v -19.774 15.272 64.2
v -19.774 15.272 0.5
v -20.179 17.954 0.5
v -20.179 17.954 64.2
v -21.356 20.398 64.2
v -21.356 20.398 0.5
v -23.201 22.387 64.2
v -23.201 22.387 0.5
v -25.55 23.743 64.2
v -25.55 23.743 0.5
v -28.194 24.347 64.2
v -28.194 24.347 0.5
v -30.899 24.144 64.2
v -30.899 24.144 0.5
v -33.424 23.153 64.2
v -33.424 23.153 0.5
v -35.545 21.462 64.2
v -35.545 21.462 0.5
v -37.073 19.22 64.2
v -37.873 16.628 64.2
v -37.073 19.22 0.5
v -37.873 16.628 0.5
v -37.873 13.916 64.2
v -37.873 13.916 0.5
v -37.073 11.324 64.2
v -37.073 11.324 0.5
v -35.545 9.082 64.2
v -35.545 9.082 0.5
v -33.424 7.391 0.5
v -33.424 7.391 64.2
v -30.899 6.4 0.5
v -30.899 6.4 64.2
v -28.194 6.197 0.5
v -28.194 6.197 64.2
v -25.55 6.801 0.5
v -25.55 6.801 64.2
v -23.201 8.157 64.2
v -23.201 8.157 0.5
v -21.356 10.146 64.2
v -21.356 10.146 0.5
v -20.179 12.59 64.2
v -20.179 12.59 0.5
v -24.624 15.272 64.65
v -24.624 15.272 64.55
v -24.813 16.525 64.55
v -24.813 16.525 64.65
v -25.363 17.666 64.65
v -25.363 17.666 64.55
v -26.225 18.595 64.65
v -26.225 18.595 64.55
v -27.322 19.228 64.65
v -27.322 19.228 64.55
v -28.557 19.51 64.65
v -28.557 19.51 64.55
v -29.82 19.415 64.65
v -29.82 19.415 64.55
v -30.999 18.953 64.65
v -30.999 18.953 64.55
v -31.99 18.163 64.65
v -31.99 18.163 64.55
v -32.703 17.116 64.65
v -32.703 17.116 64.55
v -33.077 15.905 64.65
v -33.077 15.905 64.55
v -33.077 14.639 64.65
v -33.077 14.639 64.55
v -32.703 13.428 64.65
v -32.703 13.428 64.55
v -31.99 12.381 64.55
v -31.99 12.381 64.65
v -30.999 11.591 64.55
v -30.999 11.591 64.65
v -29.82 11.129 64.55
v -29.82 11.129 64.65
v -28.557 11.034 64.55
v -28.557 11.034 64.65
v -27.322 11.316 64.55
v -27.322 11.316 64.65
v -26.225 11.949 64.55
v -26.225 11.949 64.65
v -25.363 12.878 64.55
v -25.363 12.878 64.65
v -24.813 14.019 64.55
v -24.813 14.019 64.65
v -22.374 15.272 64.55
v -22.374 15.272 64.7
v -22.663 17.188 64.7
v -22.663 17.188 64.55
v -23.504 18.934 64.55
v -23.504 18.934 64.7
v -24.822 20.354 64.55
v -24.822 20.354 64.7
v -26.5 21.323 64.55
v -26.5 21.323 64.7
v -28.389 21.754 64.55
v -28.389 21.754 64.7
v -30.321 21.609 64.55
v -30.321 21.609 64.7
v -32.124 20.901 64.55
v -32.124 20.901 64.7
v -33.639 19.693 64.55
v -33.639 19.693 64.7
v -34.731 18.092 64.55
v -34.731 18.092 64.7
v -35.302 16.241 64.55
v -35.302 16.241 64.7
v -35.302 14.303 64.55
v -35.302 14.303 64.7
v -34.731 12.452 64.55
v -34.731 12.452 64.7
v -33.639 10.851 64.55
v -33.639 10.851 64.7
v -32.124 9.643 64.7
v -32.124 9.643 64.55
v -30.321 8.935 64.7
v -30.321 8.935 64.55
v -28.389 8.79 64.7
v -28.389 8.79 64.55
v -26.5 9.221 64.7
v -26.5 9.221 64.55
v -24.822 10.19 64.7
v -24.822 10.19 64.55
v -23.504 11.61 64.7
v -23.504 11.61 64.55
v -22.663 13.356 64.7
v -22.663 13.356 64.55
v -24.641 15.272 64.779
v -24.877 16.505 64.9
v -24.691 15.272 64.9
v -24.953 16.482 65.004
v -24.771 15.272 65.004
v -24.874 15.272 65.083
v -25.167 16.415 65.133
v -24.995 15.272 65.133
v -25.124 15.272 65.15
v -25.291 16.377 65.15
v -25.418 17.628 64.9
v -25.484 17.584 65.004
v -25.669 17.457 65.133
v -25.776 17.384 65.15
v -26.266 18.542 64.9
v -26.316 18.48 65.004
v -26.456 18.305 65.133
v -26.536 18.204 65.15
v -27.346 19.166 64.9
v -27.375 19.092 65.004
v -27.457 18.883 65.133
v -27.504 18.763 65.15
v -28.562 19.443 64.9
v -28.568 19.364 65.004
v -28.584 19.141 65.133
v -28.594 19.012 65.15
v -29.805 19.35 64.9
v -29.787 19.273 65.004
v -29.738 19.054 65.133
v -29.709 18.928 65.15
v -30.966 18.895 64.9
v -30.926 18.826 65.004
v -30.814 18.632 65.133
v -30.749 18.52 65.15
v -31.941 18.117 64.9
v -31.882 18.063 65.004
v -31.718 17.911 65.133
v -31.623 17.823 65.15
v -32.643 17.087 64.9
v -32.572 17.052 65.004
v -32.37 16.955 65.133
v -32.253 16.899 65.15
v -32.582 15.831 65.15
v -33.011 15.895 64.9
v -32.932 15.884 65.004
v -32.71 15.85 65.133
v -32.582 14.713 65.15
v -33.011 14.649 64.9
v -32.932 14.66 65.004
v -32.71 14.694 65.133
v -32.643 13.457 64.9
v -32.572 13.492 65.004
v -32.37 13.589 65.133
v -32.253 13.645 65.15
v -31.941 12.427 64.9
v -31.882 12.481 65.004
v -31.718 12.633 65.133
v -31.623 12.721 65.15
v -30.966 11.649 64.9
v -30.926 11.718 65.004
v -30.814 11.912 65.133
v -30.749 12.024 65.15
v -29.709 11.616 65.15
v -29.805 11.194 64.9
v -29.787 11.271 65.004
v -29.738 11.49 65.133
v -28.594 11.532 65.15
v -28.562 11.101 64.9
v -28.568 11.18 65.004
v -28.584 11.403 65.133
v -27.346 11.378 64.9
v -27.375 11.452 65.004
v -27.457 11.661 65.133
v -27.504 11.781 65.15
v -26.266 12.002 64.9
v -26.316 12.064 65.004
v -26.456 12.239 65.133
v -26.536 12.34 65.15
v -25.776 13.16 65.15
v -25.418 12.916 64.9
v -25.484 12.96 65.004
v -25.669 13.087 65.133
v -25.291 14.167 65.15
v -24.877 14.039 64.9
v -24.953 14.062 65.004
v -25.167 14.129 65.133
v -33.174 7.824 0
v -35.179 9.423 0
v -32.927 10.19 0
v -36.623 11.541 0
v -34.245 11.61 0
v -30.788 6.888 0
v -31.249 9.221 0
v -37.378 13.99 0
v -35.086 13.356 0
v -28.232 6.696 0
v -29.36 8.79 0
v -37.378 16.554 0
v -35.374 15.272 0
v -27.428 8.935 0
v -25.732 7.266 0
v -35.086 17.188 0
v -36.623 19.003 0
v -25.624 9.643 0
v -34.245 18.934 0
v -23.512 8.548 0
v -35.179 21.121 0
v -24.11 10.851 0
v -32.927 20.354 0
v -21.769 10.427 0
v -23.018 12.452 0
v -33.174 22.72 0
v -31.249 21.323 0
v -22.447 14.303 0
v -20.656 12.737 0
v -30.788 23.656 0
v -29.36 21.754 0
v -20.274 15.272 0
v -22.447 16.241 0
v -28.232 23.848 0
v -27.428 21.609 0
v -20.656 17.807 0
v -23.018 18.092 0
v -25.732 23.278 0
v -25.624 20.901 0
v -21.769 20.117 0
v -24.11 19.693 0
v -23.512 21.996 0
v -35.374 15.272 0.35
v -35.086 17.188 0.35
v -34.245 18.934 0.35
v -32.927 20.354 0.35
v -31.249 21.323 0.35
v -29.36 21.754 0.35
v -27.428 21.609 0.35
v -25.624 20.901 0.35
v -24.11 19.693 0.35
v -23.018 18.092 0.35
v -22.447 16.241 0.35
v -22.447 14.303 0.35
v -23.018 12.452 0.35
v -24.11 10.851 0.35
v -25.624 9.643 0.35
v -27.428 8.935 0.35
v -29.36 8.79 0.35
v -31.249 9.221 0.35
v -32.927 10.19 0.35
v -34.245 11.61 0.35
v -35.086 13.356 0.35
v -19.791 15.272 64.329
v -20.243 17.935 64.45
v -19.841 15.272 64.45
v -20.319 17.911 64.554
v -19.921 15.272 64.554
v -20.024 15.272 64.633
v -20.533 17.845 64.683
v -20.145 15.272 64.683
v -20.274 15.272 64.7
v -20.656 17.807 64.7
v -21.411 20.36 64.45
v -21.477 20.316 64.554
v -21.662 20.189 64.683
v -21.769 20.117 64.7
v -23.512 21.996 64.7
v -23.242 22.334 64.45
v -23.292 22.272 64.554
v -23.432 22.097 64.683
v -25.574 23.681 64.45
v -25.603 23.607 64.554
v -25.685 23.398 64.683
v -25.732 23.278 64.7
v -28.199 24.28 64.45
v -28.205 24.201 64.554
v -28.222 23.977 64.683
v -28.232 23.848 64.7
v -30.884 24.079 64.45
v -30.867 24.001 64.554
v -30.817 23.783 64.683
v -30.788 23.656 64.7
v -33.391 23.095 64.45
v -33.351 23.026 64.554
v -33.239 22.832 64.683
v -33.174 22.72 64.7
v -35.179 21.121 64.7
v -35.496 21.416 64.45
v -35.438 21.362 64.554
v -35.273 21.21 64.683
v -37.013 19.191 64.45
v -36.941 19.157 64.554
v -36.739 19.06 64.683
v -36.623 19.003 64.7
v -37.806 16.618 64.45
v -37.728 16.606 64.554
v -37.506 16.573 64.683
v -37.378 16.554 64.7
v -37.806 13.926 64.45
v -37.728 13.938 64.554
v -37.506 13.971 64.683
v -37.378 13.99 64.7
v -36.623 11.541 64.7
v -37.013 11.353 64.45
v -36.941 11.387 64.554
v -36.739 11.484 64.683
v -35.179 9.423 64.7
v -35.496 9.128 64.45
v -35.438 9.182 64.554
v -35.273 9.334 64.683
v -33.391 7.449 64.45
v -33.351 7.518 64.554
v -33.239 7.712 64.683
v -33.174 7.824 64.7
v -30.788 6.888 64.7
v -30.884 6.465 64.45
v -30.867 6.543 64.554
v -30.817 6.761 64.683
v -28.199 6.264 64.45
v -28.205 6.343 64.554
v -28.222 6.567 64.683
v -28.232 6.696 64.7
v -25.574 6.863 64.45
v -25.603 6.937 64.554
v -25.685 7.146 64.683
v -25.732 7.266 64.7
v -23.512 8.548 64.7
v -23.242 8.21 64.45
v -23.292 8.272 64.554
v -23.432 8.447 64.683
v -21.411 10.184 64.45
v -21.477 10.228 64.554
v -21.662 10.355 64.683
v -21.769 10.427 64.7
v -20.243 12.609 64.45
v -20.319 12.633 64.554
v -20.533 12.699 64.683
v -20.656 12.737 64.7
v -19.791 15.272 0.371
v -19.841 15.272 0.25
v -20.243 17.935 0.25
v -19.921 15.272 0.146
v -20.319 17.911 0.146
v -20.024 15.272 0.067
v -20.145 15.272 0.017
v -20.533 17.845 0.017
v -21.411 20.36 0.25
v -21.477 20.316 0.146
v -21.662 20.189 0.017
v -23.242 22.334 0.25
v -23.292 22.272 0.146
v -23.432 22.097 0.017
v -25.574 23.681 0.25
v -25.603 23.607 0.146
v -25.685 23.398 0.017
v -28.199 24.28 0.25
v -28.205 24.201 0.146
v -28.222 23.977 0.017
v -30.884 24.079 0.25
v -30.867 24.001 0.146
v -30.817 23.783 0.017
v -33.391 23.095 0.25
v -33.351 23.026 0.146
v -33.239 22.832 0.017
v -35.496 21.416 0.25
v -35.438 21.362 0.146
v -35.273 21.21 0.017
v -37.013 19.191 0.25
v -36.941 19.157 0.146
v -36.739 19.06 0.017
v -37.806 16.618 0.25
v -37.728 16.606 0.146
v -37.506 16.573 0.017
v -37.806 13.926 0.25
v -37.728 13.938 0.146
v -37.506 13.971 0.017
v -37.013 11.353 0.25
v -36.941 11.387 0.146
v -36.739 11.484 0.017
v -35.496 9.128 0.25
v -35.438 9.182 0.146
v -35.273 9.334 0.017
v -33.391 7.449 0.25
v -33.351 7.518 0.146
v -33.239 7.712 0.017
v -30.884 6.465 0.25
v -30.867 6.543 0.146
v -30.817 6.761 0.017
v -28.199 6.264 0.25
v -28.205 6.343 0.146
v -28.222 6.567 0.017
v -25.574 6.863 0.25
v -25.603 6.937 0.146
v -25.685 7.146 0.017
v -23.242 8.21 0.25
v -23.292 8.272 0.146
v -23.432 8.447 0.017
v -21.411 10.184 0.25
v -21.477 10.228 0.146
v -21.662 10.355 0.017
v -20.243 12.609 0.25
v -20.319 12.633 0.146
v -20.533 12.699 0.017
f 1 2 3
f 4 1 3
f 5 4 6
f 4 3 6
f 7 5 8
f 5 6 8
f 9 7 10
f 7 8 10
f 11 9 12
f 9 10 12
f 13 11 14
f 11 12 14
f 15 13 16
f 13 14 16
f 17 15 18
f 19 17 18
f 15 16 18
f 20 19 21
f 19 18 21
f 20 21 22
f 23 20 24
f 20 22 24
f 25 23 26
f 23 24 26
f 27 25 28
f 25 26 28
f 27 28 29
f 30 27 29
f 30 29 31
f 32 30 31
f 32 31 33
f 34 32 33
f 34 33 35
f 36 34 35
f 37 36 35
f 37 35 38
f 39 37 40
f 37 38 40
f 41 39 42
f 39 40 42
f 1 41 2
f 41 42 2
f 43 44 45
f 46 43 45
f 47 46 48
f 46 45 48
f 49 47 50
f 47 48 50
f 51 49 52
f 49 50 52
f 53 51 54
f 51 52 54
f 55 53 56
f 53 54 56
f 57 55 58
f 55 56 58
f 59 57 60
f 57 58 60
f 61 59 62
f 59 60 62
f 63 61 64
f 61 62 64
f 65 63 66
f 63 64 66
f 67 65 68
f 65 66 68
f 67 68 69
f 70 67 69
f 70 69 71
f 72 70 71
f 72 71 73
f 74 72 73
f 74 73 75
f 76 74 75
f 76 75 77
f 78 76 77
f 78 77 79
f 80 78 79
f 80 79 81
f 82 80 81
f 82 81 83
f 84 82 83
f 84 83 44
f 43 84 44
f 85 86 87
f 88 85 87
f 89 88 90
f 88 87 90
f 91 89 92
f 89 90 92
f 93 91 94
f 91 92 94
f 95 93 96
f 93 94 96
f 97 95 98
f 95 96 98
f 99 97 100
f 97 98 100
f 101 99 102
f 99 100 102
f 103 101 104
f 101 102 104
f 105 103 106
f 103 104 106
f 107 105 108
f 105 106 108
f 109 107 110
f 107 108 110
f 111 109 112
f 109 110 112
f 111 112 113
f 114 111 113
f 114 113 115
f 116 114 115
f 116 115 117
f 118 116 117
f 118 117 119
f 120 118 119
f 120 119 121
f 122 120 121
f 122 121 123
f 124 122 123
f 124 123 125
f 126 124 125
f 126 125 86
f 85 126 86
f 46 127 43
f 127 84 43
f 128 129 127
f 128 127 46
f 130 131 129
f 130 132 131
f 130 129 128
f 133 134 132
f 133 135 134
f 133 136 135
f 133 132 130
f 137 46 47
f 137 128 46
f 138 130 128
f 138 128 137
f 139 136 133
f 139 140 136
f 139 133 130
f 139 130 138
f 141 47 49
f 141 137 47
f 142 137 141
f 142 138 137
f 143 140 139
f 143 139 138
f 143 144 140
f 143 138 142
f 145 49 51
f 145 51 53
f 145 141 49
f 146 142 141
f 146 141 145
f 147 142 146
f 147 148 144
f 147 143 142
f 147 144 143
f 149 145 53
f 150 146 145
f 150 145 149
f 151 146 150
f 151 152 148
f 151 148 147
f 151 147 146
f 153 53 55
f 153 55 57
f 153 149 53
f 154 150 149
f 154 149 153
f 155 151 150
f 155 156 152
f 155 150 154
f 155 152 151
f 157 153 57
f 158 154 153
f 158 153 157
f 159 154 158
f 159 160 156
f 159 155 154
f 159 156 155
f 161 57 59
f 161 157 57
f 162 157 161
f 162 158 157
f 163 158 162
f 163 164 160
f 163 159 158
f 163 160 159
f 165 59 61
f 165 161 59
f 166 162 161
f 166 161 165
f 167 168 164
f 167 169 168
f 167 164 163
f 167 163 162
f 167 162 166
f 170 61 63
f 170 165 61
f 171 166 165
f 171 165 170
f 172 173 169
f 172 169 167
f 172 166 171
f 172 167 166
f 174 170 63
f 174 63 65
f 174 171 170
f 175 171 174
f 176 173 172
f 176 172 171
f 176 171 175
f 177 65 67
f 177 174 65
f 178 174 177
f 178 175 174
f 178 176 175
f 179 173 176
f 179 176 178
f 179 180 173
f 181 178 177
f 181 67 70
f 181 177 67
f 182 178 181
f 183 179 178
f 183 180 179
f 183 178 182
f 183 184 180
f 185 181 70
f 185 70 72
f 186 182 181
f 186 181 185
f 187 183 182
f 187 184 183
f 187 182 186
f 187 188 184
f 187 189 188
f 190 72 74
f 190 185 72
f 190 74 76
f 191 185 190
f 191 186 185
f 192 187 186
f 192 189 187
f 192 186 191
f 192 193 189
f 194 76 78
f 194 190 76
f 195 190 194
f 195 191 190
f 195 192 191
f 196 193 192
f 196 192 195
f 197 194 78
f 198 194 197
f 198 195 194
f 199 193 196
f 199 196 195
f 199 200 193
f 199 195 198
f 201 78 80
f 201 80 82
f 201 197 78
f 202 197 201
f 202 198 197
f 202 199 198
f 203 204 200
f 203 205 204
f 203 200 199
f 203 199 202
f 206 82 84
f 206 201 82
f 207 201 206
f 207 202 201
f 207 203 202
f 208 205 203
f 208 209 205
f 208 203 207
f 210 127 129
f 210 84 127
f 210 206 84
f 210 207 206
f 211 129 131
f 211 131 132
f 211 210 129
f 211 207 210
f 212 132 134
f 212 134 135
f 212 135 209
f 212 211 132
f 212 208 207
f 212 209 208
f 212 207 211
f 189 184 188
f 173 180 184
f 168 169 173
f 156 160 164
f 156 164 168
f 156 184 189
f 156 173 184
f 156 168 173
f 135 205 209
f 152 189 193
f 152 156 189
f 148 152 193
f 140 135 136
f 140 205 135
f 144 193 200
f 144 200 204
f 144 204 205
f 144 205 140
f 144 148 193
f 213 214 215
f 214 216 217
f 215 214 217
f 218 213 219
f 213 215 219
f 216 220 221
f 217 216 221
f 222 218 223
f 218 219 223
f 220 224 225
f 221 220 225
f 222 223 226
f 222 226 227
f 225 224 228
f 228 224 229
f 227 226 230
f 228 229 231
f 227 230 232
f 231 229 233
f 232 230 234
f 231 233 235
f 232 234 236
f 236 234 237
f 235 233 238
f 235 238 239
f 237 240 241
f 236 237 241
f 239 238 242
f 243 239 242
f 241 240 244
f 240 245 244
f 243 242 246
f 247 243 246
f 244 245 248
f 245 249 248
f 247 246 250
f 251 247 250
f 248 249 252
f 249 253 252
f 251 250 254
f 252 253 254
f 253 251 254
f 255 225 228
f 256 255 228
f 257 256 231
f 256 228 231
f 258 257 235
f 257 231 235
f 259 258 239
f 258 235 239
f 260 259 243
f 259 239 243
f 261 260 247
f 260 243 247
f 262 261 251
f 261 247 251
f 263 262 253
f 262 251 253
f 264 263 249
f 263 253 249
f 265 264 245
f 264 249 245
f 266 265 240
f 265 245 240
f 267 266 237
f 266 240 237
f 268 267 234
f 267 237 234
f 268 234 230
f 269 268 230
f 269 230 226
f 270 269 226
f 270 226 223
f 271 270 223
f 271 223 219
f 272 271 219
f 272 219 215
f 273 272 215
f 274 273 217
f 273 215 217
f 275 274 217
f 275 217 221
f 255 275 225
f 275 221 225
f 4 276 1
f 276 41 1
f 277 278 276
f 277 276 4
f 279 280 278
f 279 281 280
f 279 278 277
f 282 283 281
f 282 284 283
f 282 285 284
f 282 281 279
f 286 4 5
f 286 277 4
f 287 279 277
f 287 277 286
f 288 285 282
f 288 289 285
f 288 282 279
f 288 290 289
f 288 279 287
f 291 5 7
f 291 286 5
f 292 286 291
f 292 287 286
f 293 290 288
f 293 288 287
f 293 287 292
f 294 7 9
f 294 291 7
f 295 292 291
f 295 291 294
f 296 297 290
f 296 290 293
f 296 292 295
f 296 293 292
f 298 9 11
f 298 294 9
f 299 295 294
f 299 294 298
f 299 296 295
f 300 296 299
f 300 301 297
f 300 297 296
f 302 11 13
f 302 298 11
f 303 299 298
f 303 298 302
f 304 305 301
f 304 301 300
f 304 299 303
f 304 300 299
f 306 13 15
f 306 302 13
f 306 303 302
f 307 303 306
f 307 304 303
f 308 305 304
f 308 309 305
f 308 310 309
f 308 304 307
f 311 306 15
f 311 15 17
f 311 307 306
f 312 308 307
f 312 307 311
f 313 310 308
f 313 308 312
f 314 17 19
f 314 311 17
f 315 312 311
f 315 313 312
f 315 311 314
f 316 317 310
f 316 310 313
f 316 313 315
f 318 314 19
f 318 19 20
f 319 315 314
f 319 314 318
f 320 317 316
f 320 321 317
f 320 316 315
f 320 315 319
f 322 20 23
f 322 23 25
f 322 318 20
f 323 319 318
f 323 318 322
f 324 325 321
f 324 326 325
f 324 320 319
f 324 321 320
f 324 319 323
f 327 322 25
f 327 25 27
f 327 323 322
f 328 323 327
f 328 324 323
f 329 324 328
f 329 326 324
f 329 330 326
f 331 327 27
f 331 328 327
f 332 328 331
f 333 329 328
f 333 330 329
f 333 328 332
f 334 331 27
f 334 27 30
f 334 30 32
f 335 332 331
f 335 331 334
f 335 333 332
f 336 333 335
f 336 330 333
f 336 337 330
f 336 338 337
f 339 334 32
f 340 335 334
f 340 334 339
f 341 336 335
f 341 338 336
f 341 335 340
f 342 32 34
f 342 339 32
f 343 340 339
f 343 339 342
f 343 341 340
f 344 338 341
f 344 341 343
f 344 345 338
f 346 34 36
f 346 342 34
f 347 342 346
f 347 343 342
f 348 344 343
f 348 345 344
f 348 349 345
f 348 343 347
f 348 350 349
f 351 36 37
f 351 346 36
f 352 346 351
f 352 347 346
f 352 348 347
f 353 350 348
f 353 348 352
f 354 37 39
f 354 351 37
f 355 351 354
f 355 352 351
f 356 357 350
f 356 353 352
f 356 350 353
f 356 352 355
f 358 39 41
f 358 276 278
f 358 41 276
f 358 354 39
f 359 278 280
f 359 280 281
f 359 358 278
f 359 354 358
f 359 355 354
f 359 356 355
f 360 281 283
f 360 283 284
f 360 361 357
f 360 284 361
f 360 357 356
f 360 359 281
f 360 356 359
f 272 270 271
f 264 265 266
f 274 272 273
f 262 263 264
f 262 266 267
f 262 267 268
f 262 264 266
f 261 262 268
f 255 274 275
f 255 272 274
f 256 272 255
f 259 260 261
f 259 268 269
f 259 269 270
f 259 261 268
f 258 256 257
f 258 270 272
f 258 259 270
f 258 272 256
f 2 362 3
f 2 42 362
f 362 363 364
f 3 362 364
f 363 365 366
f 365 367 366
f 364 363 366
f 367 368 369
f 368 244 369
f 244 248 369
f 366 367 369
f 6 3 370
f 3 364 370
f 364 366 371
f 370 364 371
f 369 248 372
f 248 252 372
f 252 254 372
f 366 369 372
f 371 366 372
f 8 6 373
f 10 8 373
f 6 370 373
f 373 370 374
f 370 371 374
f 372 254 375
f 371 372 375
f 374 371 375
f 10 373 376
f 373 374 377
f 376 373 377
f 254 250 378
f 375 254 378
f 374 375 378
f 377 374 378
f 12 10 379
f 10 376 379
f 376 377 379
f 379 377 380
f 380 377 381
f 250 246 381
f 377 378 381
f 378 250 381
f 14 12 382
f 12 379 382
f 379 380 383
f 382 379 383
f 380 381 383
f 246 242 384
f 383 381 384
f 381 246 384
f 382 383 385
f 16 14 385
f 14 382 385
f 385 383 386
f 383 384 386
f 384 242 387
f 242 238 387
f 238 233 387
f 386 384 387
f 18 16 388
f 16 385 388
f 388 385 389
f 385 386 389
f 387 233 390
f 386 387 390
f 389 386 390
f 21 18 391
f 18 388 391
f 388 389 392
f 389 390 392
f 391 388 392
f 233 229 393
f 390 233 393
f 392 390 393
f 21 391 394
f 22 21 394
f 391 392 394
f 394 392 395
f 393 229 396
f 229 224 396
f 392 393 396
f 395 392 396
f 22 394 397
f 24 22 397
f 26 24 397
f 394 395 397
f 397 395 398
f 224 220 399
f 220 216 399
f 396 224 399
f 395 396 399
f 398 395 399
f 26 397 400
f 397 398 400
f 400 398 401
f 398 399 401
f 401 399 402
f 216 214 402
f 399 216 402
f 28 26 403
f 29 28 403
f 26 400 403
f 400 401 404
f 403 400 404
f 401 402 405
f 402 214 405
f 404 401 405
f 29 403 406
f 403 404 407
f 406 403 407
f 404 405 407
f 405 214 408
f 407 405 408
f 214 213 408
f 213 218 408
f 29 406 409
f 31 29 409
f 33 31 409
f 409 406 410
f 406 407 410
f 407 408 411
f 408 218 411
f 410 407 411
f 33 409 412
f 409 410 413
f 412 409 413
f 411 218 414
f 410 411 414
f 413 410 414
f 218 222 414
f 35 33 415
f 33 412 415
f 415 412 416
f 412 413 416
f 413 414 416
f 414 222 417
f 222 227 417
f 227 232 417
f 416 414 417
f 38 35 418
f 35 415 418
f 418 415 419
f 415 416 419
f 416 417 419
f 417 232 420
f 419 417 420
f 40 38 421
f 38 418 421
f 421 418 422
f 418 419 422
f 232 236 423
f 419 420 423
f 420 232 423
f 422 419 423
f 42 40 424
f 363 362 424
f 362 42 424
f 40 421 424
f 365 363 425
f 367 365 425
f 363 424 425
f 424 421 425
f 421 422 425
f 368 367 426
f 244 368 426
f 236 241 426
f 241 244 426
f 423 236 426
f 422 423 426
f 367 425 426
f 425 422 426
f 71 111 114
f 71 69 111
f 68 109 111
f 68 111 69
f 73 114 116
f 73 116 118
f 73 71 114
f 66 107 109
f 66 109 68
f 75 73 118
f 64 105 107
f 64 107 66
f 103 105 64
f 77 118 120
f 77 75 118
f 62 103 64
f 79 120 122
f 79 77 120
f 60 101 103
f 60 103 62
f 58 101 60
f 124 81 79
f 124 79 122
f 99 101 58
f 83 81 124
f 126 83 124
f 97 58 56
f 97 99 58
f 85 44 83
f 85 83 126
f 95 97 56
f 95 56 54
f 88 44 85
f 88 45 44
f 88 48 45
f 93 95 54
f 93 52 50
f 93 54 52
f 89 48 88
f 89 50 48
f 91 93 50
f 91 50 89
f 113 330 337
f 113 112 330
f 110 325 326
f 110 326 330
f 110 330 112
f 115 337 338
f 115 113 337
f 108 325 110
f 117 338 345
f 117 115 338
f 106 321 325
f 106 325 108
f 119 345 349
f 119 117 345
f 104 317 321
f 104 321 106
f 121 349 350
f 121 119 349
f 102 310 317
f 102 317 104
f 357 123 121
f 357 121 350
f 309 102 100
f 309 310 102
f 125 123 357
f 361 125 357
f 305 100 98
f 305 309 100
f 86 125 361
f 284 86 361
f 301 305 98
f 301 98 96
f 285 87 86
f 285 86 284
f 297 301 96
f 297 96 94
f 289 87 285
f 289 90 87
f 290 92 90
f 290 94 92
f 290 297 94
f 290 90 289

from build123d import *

# Parameters (mm, degrees)
SKETCH_1_R          = 9.1
EXTRUDE_1_DEPTH     = 64.7
FILLET_1_R          = 0.5
FILLET_2_R          = 0.5
SKETCH_2_R          = 6.5
CUT_EXTRUDE_1_DEPTH = 0.35
SKETCH_3_R          = 6.5
CUT_EXTRUDE_2_DEPTH = 0.35
SKETCH_4_R          = 4.25
EXTRUDE_2_DEPTH     = 0.8
FILLET_3_R          = 0.5
SKETCH_5_R          = 6.5
SKETCH_5_R_2        = 4.25
EXTRUDE_3_DEPTH     = 0.2


with BuildPart() as part:
    # 草图1 → 凸台-拉伸1 (new body)
    with BuildSketch(Plane.XY):
        with Locations((-28.874360447, 15.271996124)):
            Circle(SKETCH_1_R)
    extrude(amount=EXTRUDE_1_DEPTH)

    # 圆角1
    fillet_1_edges = [part.edges().sort_by_distance(p)[0] for p in [
        (-37.974360447, 15.271996124, 0),
    ]]
    fillet(fillet_1_edges, radius=FILLET_1_R)

    # 圆角2
    fillet_2_edges = [part.edges().sort_by_distance(p)[0] for p in [
        (-37.974360447, 15.271996124, 64.7),
    ]]
    fillet(fillet_2_edges, radius=FILLET_2_R)

    # 草图2 → 切除-拉伸1 (cut)
    with BuildSketch(Plane(origin=(0, 0, 0), x_dir=(-1, 0, 0), z_dir=(0, 0, -1))):
        with Locations((28.874360447, 15.271996124)):
            Circle(SKETCH_2_R)
    extrude(amount=-CUT_EXTRUDE_1_DEPTH, mode=Mode.SUBTRACT)

    # 草图3 → 切除-拉伸2 (cut)
    with BuildSketch(Plane.XY.offset(64.7)):
        with Locations((-28.874360447, 15.271996124)):
            Circle(SKETCH_3_R)
    extrude(amount=-CUT_EXTRUDE_2_DEPTH, mode=Mode.SUBTRACT)

    # 草图4 → 凸台-拉伸2 (add)
    with BuildSketch(Plane.XY.offset(64.35)):
        with Locations((-28.874360447, 15.271996124)):
            Circle(SKETCH_4_R)
    extrude(amount=EXTRUDE_2_DEPTH)

    # 圆角3
    fillet_3_edges = [part.edges().sort_by_distance(p)[0] for p in [
        (-33.124360447, 15.271996124, 65.15),
    ]]
    fillet(fillet_3_edges, radius=FILLET_3_R)

    # 草图5 → 凸台-拉伸3 (add)
    with BuildSketch(Plane.XY.offset(64.35)):
        with Locations((-28.874360447, 15.271996124)):
            Circle(SKETCH_5_R)
        with Locations((-28.874360447, 15.271996124)):
            Circle(SKETCH_5_R_2, mode=Mode.SUBTRACT)
    extrude(amount=EXTRUDE_3_DEPTH)


solid = part.part
